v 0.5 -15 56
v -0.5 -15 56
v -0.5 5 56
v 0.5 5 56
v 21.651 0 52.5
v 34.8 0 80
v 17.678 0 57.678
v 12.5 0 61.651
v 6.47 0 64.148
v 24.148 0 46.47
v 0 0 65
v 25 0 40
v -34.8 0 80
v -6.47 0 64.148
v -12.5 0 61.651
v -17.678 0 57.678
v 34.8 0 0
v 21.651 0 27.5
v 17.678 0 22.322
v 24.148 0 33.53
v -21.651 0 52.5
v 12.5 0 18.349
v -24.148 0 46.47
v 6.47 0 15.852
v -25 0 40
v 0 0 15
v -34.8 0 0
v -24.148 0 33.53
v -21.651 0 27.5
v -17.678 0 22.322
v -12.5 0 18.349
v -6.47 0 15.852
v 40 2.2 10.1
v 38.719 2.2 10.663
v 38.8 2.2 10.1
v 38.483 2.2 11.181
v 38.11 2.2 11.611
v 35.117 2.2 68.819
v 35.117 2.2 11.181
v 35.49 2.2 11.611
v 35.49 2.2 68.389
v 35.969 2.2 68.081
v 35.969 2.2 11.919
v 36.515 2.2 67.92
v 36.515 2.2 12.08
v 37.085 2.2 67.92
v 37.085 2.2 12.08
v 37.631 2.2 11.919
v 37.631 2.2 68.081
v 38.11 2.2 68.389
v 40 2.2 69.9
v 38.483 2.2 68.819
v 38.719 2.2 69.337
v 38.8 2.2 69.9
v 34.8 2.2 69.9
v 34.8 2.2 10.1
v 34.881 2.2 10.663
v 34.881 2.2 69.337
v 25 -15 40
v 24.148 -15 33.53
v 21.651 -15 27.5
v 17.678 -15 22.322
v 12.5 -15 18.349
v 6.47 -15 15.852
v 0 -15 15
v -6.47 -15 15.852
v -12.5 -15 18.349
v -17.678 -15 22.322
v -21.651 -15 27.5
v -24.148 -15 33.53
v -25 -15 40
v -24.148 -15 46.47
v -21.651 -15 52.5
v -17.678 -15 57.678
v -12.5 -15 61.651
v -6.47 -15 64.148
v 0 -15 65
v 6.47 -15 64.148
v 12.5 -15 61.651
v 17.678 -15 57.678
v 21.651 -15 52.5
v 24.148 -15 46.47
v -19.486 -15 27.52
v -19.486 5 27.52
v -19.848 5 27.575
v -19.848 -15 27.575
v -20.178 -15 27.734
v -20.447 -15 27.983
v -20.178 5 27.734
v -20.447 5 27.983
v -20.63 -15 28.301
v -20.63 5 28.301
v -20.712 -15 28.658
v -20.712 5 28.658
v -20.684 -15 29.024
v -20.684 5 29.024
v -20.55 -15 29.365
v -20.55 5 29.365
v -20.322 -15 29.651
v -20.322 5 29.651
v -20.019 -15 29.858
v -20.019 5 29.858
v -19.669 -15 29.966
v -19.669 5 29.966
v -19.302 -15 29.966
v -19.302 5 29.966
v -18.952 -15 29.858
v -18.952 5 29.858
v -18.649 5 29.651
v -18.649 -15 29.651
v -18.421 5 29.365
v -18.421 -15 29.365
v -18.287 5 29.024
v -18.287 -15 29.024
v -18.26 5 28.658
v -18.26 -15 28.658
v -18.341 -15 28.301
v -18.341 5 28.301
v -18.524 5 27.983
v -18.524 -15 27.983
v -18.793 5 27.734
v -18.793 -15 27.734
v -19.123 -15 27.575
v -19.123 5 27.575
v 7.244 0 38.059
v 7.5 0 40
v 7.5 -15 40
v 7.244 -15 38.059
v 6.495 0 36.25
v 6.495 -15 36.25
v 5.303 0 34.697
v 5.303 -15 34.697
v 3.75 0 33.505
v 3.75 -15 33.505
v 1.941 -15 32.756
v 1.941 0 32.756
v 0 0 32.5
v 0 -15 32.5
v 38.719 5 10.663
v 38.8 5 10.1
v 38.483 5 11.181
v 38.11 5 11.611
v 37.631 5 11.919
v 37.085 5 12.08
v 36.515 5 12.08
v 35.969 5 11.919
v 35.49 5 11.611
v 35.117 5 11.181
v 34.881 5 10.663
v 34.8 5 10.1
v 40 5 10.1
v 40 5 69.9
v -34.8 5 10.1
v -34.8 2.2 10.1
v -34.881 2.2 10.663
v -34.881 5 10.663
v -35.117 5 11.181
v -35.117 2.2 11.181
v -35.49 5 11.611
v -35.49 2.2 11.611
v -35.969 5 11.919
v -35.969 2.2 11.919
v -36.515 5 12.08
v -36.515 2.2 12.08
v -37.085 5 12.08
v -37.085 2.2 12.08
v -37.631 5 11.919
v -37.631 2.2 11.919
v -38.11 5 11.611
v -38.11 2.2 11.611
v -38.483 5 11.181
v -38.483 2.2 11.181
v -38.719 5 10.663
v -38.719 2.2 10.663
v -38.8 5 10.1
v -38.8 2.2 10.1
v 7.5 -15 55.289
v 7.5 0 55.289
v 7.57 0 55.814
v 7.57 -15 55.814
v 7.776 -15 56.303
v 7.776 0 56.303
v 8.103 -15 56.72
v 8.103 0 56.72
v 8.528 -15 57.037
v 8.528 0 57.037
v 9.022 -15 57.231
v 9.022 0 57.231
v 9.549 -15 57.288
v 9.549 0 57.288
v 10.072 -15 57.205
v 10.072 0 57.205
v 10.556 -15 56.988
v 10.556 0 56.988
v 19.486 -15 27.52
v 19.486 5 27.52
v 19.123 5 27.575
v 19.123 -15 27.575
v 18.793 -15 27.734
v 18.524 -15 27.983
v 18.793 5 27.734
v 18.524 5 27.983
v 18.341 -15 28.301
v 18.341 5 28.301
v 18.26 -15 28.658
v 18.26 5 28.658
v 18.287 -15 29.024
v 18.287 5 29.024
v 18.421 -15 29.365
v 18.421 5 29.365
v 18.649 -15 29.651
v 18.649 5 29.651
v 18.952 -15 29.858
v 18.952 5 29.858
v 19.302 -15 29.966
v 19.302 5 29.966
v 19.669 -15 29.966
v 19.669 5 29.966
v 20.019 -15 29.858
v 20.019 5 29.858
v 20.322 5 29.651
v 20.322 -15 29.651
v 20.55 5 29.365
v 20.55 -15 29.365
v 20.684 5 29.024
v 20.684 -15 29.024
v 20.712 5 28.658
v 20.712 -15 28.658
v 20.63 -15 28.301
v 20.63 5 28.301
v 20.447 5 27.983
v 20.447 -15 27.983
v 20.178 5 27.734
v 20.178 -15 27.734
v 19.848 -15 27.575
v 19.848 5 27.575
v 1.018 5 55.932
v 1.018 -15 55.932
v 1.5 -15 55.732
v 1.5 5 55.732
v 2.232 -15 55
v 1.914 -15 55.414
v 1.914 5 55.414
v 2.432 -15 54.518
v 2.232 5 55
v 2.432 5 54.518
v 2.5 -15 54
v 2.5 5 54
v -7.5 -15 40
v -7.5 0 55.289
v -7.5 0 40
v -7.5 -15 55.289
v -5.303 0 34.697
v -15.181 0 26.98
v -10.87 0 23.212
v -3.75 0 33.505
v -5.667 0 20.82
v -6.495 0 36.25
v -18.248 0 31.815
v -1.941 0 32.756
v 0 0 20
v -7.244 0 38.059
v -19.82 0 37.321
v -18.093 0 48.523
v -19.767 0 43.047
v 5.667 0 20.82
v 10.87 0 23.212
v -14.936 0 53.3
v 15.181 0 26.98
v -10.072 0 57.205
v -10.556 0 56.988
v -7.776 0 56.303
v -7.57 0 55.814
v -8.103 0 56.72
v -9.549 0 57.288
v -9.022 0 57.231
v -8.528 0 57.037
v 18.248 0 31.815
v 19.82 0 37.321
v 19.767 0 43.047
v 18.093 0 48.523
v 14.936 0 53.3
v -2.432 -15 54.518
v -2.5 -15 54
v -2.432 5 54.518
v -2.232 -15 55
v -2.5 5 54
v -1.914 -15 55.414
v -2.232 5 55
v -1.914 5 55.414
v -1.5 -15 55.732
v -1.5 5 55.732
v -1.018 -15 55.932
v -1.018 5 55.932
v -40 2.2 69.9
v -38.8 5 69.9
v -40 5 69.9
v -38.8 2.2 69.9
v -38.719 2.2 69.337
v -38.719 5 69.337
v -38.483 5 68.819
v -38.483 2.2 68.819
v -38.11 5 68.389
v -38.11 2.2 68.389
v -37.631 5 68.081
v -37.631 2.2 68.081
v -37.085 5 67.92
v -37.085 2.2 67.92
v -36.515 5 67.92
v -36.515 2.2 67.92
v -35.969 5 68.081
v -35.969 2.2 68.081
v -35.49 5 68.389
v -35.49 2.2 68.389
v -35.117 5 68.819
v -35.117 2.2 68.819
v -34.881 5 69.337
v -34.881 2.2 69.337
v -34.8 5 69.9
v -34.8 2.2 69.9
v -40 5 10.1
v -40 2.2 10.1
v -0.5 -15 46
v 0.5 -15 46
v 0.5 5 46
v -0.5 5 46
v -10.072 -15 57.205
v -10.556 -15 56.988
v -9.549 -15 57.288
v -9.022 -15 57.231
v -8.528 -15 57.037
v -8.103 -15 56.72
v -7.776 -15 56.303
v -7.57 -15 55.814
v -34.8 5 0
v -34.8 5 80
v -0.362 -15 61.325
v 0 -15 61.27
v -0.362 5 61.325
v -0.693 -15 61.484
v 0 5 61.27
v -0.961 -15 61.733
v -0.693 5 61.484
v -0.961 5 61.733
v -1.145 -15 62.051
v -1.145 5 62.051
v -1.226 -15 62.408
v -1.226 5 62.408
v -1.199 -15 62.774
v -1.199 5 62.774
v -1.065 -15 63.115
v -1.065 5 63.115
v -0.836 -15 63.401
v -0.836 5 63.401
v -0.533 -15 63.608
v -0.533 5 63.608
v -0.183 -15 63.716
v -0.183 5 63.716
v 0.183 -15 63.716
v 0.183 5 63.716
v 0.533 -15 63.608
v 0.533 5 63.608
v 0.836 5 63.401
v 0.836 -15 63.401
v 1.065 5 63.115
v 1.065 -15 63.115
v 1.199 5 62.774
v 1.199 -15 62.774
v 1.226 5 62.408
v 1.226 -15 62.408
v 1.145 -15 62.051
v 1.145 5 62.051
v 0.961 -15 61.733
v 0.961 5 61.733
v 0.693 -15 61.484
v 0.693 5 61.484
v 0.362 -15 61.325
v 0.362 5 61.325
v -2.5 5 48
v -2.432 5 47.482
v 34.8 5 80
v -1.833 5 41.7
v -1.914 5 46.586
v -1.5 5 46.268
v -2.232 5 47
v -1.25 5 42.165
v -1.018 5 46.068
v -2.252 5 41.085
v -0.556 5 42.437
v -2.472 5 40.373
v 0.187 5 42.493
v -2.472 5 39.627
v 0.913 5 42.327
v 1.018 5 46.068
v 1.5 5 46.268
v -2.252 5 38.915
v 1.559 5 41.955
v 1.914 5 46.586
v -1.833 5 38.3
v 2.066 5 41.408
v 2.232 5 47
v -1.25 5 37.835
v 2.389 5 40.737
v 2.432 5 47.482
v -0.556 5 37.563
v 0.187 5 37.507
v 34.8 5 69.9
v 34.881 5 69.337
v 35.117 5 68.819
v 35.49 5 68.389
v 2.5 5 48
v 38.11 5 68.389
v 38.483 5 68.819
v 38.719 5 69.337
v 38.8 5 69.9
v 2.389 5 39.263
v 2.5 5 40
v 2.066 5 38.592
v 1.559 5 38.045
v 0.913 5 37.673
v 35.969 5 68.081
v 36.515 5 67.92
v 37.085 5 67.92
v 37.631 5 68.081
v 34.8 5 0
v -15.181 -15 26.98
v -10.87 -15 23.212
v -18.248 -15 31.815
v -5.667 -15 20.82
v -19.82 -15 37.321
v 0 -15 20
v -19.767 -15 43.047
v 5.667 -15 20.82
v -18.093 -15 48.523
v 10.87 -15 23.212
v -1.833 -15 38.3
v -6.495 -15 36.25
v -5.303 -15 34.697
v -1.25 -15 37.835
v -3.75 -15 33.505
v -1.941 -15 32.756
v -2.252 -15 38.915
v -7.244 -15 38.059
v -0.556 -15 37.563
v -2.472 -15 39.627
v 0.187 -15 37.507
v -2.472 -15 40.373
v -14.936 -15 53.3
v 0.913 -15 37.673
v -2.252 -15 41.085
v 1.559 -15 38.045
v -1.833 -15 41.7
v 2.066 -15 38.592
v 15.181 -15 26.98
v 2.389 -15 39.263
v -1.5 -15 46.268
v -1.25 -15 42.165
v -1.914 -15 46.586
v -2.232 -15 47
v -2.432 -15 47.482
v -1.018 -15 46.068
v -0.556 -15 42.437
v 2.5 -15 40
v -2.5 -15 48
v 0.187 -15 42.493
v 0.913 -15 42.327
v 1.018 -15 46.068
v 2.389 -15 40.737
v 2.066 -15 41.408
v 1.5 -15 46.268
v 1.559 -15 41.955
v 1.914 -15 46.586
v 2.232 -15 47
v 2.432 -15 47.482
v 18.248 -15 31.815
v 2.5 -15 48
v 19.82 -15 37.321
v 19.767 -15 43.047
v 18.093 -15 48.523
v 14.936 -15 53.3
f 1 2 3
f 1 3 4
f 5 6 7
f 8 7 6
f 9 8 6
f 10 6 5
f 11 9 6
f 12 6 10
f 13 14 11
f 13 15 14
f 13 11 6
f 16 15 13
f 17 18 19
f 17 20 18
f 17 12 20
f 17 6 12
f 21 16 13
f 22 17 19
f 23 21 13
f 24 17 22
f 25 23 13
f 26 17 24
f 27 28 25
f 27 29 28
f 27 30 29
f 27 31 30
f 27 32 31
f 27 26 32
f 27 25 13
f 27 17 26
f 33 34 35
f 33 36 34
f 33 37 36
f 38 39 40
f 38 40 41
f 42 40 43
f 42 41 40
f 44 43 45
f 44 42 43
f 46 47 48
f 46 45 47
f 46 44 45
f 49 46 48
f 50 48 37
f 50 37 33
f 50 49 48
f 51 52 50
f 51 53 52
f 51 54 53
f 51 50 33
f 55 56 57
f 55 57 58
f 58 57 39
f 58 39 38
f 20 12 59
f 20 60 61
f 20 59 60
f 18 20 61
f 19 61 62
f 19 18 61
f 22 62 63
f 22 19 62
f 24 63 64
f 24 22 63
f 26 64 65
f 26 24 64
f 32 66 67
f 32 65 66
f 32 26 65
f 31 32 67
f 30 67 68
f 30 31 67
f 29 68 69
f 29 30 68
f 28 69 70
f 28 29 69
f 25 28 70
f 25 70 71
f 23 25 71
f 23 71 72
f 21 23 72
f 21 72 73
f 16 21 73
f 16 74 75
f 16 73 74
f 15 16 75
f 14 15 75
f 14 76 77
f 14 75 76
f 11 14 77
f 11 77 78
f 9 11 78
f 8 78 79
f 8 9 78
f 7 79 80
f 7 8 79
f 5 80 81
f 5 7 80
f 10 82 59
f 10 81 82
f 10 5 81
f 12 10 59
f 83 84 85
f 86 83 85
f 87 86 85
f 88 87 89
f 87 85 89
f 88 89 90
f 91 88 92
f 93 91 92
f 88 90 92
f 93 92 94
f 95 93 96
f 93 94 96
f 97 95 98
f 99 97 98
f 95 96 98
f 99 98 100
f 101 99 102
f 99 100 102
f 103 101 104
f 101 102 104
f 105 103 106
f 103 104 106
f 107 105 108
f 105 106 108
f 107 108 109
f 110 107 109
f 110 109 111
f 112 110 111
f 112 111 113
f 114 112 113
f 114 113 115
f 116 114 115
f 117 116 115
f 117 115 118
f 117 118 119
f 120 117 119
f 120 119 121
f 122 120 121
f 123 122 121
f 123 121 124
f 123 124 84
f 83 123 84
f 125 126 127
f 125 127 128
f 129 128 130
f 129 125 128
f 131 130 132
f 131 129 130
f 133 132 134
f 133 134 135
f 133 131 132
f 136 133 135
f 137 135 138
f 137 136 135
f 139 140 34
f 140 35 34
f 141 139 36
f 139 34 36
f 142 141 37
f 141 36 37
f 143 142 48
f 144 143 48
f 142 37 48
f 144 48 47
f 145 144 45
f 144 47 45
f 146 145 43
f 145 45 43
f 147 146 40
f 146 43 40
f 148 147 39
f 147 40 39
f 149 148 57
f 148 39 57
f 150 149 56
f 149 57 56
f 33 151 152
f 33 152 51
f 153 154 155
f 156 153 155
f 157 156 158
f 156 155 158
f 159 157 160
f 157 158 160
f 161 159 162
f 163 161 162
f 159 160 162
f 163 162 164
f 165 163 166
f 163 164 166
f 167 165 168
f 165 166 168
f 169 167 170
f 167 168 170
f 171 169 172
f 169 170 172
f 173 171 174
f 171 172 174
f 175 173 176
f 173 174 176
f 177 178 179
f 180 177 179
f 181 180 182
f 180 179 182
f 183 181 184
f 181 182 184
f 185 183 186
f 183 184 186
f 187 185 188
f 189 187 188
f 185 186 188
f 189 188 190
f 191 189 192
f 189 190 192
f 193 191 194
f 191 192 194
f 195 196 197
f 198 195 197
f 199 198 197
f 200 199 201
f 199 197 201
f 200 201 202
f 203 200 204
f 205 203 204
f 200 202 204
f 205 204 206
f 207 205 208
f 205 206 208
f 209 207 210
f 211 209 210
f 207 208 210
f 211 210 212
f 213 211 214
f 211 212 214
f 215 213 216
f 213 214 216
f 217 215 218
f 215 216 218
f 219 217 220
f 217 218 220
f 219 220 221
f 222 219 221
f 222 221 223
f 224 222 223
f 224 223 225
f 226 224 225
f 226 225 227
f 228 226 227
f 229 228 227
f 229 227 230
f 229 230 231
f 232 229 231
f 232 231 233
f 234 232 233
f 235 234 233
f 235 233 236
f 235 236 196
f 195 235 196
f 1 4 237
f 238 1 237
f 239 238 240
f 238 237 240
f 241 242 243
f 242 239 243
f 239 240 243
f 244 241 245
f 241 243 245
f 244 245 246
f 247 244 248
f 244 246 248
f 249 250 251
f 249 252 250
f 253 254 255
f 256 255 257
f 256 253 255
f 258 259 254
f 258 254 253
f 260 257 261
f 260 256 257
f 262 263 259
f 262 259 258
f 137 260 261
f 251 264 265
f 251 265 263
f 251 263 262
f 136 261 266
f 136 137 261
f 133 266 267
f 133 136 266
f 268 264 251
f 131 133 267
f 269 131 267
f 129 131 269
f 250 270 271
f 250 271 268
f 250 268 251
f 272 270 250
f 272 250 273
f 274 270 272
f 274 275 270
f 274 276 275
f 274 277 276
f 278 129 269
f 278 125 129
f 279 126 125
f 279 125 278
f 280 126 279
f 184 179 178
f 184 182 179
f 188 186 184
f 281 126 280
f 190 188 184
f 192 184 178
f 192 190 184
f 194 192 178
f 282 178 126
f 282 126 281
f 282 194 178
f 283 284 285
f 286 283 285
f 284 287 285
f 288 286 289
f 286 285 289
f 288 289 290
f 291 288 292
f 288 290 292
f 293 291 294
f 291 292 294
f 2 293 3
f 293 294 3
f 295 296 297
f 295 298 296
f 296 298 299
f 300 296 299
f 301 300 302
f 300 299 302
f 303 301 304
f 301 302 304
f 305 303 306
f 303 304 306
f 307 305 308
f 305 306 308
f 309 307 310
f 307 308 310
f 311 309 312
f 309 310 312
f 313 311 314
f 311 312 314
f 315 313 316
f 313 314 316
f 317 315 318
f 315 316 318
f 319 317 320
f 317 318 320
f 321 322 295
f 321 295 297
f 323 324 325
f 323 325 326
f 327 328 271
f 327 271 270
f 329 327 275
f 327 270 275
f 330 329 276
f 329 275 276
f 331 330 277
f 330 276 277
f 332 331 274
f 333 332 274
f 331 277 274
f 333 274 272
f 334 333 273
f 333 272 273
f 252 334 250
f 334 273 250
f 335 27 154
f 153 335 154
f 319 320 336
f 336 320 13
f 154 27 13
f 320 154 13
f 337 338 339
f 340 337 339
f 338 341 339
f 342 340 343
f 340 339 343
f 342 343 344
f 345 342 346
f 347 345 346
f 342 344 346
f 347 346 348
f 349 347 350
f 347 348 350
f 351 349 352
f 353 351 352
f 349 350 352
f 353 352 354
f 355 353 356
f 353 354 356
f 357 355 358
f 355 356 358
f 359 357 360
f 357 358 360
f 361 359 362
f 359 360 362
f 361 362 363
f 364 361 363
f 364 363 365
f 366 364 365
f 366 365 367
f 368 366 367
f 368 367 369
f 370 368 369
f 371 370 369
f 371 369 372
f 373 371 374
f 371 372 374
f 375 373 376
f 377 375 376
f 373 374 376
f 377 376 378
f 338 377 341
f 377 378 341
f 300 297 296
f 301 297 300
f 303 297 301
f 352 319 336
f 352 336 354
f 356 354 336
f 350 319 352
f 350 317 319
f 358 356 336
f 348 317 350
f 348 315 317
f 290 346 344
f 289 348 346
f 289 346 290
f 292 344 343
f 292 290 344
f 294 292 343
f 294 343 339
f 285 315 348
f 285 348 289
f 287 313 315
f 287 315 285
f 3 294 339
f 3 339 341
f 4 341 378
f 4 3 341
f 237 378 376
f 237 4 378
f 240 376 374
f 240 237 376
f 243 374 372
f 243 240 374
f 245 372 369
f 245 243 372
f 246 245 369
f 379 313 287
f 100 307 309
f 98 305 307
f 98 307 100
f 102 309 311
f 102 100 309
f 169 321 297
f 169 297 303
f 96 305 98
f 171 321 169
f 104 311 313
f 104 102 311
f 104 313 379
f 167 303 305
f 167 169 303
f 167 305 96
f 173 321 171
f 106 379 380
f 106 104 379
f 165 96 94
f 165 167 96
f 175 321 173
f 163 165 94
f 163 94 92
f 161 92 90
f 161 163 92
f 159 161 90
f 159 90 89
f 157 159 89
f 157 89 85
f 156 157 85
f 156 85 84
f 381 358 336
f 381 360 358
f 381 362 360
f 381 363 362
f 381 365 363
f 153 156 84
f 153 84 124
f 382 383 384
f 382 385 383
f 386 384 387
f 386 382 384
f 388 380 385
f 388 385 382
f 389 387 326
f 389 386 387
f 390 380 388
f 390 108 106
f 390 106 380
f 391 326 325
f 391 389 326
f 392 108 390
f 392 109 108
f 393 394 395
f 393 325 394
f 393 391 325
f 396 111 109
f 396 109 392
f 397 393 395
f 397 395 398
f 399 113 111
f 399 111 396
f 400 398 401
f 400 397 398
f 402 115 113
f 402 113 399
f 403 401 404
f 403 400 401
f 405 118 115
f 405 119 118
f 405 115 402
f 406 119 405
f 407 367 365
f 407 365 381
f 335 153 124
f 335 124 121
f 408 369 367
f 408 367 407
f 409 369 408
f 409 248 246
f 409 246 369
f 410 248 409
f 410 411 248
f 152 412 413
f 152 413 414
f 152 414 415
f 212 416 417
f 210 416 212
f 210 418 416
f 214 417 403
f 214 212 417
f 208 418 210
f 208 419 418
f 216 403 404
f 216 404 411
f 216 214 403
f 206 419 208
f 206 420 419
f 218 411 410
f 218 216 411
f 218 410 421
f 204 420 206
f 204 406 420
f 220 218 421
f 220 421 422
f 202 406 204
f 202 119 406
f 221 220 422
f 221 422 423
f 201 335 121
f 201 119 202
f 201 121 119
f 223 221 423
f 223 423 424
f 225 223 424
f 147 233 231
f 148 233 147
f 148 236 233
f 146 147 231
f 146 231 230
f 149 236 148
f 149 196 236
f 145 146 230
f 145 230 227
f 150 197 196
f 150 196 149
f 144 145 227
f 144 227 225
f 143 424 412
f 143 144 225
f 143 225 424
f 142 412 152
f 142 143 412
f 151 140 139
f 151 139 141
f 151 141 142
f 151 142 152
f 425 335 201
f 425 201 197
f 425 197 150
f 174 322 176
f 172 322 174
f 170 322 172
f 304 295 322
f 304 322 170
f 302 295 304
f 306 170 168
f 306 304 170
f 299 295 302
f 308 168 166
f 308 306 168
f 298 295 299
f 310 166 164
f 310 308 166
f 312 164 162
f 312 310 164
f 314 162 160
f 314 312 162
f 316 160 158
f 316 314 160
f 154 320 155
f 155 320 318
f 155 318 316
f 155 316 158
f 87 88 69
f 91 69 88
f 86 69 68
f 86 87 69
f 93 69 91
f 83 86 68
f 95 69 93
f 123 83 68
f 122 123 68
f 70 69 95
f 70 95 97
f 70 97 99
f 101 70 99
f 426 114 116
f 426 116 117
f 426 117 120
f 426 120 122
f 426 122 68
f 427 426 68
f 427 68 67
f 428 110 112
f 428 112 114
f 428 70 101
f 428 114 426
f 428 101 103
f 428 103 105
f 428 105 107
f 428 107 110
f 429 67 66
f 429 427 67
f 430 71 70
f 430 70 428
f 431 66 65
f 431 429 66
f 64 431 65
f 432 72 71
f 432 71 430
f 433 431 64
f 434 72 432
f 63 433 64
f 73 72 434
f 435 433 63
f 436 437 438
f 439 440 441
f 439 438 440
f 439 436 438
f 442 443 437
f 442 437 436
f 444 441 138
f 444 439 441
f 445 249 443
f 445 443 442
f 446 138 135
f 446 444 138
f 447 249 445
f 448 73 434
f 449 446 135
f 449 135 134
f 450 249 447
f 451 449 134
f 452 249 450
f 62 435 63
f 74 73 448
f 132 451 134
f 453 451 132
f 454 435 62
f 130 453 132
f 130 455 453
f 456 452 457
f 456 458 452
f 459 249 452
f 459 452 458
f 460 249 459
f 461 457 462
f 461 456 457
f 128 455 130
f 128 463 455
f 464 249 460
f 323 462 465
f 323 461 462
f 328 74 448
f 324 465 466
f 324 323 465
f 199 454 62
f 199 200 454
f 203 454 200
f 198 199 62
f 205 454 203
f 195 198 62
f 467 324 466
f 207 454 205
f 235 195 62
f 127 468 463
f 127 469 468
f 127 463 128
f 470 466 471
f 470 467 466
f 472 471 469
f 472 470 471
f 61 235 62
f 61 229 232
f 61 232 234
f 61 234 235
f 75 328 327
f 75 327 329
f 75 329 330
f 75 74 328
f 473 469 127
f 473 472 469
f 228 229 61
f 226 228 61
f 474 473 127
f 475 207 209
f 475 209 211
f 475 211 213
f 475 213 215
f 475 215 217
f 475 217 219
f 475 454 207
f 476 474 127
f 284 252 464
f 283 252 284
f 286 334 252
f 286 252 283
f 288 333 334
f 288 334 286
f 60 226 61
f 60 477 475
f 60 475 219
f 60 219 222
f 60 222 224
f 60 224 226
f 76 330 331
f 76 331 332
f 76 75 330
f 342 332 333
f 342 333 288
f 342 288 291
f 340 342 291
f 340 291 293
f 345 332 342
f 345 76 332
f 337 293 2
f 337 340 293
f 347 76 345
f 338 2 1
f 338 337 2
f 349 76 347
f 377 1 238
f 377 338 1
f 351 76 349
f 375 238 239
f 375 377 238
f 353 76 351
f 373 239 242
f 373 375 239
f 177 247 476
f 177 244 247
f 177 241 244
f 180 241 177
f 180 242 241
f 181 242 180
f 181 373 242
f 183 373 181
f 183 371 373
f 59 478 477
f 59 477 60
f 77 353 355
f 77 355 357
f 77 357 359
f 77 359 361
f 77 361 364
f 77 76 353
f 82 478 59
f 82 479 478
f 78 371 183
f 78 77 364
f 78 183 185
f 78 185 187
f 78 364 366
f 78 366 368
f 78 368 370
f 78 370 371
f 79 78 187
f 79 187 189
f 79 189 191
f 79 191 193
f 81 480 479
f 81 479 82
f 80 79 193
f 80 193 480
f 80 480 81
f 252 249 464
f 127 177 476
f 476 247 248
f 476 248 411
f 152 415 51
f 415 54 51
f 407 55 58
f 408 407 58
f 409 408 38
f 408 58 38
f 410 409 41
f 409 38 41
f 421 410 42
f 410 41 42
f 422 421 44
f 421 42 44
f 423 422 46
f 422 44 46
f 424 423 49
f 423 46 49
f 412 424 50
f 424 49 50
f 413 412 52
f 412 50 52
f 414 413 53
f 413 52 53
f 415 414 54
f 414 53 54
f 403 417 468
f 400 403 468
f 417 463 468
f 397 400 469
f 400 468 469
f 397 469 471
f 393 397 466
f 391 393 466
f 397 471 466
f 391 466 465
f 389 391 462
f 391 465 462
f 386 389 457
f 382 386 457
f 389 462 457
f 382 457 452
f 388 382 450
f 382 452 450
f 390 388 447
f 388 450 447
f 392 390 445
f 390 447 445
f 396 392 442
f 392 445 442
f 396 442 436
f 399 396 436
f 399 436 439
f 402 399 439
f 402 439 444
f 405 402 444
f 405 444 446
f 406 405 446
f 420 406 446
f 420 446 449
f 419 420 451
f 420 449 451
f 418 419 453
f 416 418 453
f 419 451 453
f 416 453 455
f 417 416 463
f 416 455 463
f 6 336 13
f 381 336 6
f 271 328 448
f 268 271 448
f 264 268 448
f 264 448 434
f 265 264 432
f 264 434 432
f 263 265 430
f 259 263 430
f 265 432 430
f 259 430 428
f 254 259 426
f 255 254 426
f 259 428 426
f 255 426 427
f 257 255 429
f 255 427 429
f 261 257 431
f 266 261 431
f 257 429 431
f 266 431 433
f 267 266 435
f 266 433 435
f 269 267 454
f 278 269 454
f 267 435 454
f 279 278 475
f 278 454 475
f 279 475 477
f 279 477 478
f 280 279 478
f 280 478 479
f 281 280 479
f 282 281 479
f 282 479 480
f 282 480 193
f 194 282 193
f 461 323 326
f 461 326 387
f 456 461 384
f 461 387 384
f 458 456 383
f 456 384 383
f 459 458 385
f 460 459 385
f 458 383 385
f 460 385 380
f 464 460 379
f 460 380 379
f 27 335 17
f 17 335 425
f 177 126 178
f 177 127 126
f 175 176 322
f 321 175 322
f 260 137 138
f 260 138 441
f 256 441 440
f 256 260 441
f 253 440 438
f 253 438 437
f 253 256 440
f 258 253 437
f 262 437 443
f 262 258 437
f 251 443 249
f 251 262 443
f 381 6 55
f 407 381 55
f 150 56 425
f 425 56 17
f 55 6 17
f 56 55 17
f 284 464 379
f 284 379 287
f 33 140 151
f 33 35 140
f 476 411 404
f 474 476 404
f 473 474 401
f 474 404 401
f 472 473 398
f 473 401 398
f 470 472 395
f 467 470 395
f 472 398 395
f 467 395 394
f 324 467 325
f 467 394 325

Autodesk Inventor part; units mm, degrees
ref_plane "YZ Plane" through (0, 0, 0) normal (1, 0, 0) x (0, 1, 0)
ref_plane "XZ Plane" through (0, 0, 0) normal (0, 1, 0) x (-1, 0, 0)
ref_plane "XY Plane" through (0, 0, 0) normal (0, 0, 1) x (1, 0, 0)
sketch "スケッチ1" plane through (0, 0, 0) normal (0, 0, 1) x (1, 0, 0)
  line L0 (-40, 5) -> (40, 5)
  line L1 (40, 5) -> (40, 0)
  line L2 (40, 0) -> (-40, 0)
  line L3 (-40, 0) -> (-40, 5)
  point P0 (0, 0)
  dimension "d5" = 40
  dimension "d6" = 80
  dimension "d7" = 5
  dimension "d8" = 0
extrude "押し出し1" add sketch "スケッチ1" along normal blind 80
sketch "スケッチ5" plane through (-40, 0, 0) normal (0, -1, 0) x (1, 0, 0)
  circle A0 centre (40, 40) radius 25
  point P0 (40, 0)
  dimension "d19" = 50
extrude "押し出し4" add sketch "スケッチ5" along normal blind 15
sketch "スケッチ6" plane through (0, -15, 40) normal (0, -1, 0) x (1, 0, 0)
  circle A0 centre (0, 0) radius 25 projected
  circle A1 centre (0, 0) radius 2.5
  point P0 (0, -40)
  dimension "d22" = 5
extrude "押し出し5" cut sketch "スケッチ6" against normal blind 20 contours A1
sketch "スケッチ10" plane through (-40, 0, 0) normal (0, -1, 0) x (1, 0, 0)
  line L0 (80, 0) -> (0, 0) projected
  line L1 (80, 0) -> (80, 80) projected
  line L2 (0, 80) -> (5.2, 80)
  line L3 (5.2, 80) -> (5.2, 0)
  line L4 (5.2, 0) -> (0, 0)
  line L5 (0, 0) -> (0, 80)
  line L6 (80, 80) -> (74.8, 80)
  line L7 (74.8, 80) -> (74.8, 0)
  line L8 (74.8, 0) -> (80, 0)
  line L9 (80, 0) -> (80, 80)
  point P0 (40, 0)
  dimension "d70" = 5.2
  dimension "d71" = 5.2
extrude "押し出し9" cut sketch "スケッチ10" against normal blind 2.2
sketch "スケッチ11" plane through (-40, 2.2, 0) normal (0, -1, 0) x (1, 0, 0)
  line L0 (5.2, 0) -> (5.2, 80) projected
  line L1 (0, 80) -> (5.2, 80)
  line L2 (5.2, 80) -> (5.2, 69.9)
  line L3 (5.2, 69.9) -> (0, 69.9)
  line L4 (0, 69.9) -> (0, 80)
  line L5 (0, 0) -> (5.2, 0)
  line L6 (5.2, 0) -> (5.2, 10.1)
  line L7 (5.2, 10.1) -> (0, 10.1)
  line L8 (0, 10.1) -> (0, 0)
  point P0 (40, 0)
  dimension "d76" = 10.1
  dimension "d77" = 10.1
extrude "押し出し10" cut sketch "スケッチ11" against normal through all
sketch "スケッチ12" plane through (-40, 2.2, 0) normal (0, -1, 0) x (1, 0, 0)
  line L0 (74.8, 80) -> (74.8, 0) projected
  line L1 (74.8, 80) -> (80, 80) projected
  line L2 (80, 80) -> (74.8, 80)
  line L3 (74.8, 80) -> (74.8, 69.9)
  line L4 (74.8, 69.9) -> (80, 69.9)
  line L5 (80, 69.9) -> (80, 80)
  line L6 (80, 0) -> (74.8, 0)
  line L7 (74.8, 0) -> (74.8, 10.1)
  line L8 (74.8, 10.1) -> (80, 10.1)
  line L9 (80, 10.1) -> (80, 0)
  point P0 (40, 0)
  dimension "d80" = 10.1
  dimension "d81" = 10.1
extrude "押し出し11" cut sketch "スケッチ12" against normal through all
sketch "スケッチ13" plane through (-34.8, 5, 0) normal (0, 1, 0) x (1, 0, 0)
  line L0 (74.8, -10.1) -> (69.6, -10.1) projected
  line L1 (0, 0) -> (0, -10.1) projected
  line L2 (0, -10.1) -> (-5.2, -10.1) projected
  line L3 (-5.2, -69.9) -> (0, -69.9) projected
  line L4 (69.6, -80) -> (69.6, -69.9) projected
  line L5 (69.6, -69.9) -> (74.8, -69.9) projected
  point P0 (34.8, 0)
  point P1 (-2, -10.1)
  point P2 (-2, -69.9)
  point P3 (71.6, -69.9)
  point P4 (71.6, -10.1)
  dimension "d84" = 2
  dimension "d85" = 2
  dimension "d86" = 2
  dimension "d87" = 2
hole "Hole2" at (-36.8, 5, 10.1) at (-36.8, 5, 69.9) at (36.8, 5, 69.9) at (36.8, 5, 10.1) direction (0, -1, 0) diameter 4 end through all
sketch "スケッチ14" plane through (0, -15, 40) normal (0, -1, 0) x (1, 0, 0)
  circle A0 centre (0, 0) radius 2.5 projected
  line L0 (-2.5, 16) -> (2.5, 16)
  line L1 (2.5, 16) -> (2.5, 6)
  line L2 (2.5, 6) -> (-2.5, 6)
  line L3 (-2.5, 6) -> (-2.5, 16)
  point P0 (0, -40)
  dimension "d95" = 5
  dimension "d96" = 6
  dimension "d97" = 10
extrude "押し出し12" cut sketch "スケッチ14" against normal through all contours L0 L1 L2 L3
fillet "フィレット6" radius 2 4 edges at (-2.5, -5, 56) (2.5, -5, 56) (2.5, -5, 46) (-2.5, -5, 46)
sketch "スケッチ16" plane through (0, -15, 40) normal (0, -1, 0) x (1, 0, 0)
  line L0 (-2.5, 8) -> (-2.5, 14) projected
  line L1 (2.5, 14) -> (2.5, 8) projected
  line L2 (0.5, 6) -> (-0.5, 6) projected
  circle A0 centre (0, 0) radius 2.5 projected
  circle A1 centre (0, 0) radius 25 projected
  arc A2 (-7.5, 18.5405) -> (7.5, 18.5405) centre (0, 0) ccw
  line L3 (-7.5, 18.5405) -> (-7.5, -7.5)
  line L4 (-7.5, -7.5) -> (7.5, -7.5)
  line L5 (7.5, -7.5) -> (7.5, 18.5405)
  arc A3 (7.5, 18.5405) -> (-7.5, 18.5405) centre (0, 0) ccw
  point P0 (0, -40)
  dimension "d104" = 40
  dimension "d105" = 5
  dimension "d106" = 5
  dimension "d107" = 7.5
extrude "押し出し14" cut sketch "スケッチ16" against normal up to surface (15 mm away) contours L3 L4 L5 A2
fillet "フィレット7" radius 7.5 2 edges at (7.5, -7.5, 32.5) (-7.5, -7.5, 32.5)
fillet "フィレット8" radius 2 2 edges at (7.5, -7.5, 58.5405) (-7.5, -7.5, 58.5405)
sketch "スケッチ17" plane through (0, -15, 40) normal (0, -1, 0) x (1, 0, 0)
  line L0 (0.5, 6) -> (-0.5, 6) projected
  circle A0 centre (0, 0) radius 2.5 projected
  circle A1 centre (0, 0) radius 22.5
  line L1 (0, 0) -> (0, 22.5)
  line L2 (0, 0) -> (19.4856, -11.25)
  line L3 (0, 0) -> (-19.4856, -11.25)
  point P0 (0, -40)
  point P1 (19.4856, -11.25)
  dimension "d112" = 45
  dimension "d113" = 120
  dimension "d114" = 120
hole "Hole3" at (0, -15, 62.5) at (19.4856, -15, 28.75) at (-19.4856, -15, 28.75) direction (0, 1, 0) diameter 2.459 end through all thread size "M3x0.5" class "6H" standard "ISO Metric profile"
equation "\"d5\" = 0.5 * d6"
equation "\"d9\" = d6"
equation "\"d77\" = d76"
equation "\"d81\" = d80"
equation "\"d85\" = d84"
equation "\"d86\" = d84"
equation "\"d87\" = d84"
properties part number "JointB0" material "ポリエチレン、低密度"
